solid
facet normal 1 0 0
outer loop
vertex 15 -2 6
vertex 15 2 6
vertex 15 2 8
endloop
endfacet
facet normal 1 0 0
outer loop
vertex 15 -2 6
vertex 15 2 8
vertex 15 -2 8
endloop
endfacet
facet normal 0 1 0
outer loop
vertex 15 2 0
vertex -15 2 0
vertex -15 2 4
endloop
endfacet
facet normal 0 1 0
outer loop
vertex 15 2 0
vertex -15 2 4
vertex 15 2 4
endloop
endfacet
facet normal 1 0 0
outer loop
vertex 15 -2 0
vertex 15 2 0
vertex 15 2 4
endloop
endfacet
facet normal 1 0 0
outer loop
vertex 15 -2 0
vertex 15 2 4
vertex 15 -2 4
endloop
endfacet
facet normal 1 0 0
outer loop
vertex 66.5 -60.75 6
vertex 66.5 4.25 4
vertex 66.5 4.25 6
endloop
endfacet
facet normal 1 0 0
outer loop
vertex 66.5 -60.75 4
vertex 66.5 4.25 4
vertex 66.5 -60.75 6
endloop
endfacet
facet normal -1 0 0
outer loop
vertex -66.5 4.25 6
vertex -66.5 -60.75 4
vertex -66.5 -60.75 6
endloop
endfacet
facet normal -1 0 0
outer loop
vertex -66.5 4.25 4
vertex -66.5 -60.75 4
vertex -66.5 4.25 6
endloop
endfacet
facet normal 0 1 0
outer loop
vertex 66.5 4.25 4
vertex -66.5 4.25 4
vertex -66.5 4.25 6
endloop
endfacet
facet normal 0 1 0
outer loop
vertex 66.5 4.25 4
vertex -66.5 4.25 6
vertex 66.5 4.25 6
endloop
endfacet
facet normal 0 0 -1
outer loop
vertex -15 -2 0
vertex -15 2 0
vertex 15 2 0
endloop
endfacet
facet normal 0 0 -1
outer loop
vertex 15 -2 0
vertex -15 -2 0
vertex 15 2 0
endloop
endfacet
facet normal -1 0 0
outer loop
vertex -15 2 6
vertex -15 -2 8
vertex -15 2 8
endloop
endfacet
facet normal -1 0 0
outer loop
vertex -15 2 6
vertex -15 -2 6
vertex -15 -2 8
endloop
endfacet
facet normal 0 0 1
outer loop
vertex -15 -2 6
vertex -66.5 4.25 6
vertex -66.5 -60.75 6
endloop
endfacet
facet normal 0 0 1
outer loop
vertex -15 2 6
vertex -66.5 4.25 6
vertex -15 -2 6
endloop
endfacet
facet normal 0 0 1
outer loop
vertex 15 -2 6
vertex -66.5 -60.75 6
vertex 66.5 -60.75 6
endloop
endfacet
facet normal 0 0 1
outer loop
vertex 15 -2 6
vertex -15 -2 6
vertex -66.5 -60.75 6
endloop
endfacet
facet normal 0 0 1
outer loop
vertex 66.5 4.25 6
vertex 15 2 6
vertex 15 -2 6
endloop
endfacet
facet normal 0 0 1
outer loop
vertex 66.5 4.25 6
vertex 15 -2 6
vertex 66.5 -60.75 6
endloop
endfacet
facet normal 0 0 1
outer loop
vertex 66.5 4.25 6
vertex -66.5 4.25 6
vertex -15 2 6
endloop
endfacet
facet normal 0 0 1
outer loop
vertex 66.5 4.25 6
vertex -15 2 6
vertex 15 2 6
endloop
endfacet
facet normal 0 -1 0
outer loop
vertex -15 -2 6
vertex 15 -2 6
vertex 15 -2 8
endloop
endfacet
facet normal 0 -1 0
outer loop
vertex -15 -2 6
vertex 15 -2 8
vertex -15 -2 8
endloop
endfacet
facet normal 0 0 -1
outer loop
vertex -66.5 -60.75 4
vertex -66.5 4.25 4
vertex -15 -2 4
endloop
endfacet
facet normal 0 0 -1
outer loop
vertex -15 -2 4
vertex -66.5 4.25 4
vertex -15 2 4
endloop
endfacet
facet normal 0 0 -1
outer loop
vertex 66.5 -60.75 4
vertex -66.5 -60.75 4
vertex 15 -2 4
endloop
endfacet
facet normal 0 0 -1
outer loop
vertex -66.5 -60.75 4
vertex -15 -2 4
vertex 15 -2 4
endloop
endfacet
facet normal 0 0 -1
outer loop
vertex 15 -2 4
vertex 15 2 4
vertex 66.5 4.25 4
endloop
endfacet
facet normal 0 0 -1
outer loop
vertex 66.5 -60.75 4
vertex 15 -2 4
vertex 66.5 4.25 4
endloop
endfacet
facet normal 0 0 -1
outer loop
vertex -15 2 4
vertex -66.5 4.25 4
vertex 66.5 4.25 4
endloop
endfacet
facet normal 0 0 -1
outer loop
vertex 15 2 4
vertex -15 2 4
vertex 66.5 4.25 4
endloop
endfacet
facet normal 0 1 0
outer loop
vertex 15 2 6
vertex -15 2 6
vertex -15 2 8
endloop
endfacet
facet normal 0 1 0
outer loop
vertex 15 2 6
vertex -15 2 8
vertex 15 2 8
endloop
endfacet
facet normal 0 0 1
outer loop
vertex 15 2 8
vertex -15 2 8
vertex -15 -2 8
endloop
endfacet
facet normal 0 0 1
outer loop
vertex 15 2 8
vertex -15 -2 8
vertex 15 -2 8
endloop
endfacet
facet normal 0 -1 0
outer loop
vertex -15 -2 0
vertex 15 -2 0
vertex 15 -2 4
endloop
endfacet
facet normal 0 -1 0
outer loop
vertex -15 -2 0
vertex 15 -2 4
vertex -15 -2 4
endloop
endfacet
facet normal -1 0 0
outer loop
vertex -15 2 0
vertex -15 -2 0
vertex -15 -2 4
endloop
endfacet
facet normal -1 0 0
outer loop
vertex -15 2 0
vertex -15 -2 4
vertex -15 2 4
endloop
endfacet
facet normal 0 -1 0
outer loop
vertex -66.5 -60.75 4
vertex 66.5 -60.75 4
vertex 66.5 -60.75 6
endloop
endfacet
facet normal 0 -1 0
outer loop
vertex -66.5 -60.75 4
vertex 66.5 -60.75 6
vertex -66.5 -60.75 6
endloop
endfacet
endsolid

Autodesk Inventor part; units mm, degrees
ref_plane "YZ Plane" through (0, 0, 0) normal (1, 0, 0) x (0, 1, 0)
ref_plane "XZ Plane" through (0, 0, 0) normal (0, 1, 0) x (-1, 0, 0)
ref_plane "XY Plane" through (0, 0, 0) normal (0, 0, 1) x (1, 0, 0)
sketch "Sketch1" plane through (0, 0, 0) normal (0, 0, 1) x (1, 0, 0)
  line L0 (-15, 2) -> (15, 2)
  line L1 (15, 2) -> (15, -2)
  line L2 (15, -2) -> (-15, -2)
  line L3 (-15, -2) -> (-15, 2)
  line L4 (-15, 2) -> (15, -2) construction
  line L5 (15, 2) -> (-15, -2) construction
  point P0 (0, 0)
  dimension "d0" = 30
  dimension "d1" = 4
extrude "Extrusion1" add sketch "Sketch1" along normal blind 8
sketch "Sketch2" plane through (0, 0, 8) normal (0, 0, 1) x (1, 0, 0)
  point P0 (0, 0)
ref_plane "Work Plane2" through (0, -28.25, 4) normal (0, 0, 1) x (1, 0, 0)
sketch "Sketch4" plane through (0, -28.25, 4) normal (0, 0, 1) x (1, 0, 0)
  line L0 (-66.5, 32.5) -> (66.5, 32.5)
  line L1 (66.5, 32.5) -> (66.5, -32.5)
  line L2 (66.5, -32.5) -> (-66.5, -32.5)
  line L3 (-66.5, -32.5) -> (-66.5, 32.5)
  line L4 (-66.5, 32.5) -> (66.5, -32.5) construction
  line L5 (66.5, 32.5) -> (-66.5, -32.5) construction
  line L6 (15, 26.25) -> (15, 30.25) projected
  point P0 (0, 28.25)
  point P1 (0, 0)
  dimension "d4" = 133
  dimension "d5" = 65
extrude "Extrusion2" add sketch "Sketch4" along normal blind 2
properties part number "Top"
